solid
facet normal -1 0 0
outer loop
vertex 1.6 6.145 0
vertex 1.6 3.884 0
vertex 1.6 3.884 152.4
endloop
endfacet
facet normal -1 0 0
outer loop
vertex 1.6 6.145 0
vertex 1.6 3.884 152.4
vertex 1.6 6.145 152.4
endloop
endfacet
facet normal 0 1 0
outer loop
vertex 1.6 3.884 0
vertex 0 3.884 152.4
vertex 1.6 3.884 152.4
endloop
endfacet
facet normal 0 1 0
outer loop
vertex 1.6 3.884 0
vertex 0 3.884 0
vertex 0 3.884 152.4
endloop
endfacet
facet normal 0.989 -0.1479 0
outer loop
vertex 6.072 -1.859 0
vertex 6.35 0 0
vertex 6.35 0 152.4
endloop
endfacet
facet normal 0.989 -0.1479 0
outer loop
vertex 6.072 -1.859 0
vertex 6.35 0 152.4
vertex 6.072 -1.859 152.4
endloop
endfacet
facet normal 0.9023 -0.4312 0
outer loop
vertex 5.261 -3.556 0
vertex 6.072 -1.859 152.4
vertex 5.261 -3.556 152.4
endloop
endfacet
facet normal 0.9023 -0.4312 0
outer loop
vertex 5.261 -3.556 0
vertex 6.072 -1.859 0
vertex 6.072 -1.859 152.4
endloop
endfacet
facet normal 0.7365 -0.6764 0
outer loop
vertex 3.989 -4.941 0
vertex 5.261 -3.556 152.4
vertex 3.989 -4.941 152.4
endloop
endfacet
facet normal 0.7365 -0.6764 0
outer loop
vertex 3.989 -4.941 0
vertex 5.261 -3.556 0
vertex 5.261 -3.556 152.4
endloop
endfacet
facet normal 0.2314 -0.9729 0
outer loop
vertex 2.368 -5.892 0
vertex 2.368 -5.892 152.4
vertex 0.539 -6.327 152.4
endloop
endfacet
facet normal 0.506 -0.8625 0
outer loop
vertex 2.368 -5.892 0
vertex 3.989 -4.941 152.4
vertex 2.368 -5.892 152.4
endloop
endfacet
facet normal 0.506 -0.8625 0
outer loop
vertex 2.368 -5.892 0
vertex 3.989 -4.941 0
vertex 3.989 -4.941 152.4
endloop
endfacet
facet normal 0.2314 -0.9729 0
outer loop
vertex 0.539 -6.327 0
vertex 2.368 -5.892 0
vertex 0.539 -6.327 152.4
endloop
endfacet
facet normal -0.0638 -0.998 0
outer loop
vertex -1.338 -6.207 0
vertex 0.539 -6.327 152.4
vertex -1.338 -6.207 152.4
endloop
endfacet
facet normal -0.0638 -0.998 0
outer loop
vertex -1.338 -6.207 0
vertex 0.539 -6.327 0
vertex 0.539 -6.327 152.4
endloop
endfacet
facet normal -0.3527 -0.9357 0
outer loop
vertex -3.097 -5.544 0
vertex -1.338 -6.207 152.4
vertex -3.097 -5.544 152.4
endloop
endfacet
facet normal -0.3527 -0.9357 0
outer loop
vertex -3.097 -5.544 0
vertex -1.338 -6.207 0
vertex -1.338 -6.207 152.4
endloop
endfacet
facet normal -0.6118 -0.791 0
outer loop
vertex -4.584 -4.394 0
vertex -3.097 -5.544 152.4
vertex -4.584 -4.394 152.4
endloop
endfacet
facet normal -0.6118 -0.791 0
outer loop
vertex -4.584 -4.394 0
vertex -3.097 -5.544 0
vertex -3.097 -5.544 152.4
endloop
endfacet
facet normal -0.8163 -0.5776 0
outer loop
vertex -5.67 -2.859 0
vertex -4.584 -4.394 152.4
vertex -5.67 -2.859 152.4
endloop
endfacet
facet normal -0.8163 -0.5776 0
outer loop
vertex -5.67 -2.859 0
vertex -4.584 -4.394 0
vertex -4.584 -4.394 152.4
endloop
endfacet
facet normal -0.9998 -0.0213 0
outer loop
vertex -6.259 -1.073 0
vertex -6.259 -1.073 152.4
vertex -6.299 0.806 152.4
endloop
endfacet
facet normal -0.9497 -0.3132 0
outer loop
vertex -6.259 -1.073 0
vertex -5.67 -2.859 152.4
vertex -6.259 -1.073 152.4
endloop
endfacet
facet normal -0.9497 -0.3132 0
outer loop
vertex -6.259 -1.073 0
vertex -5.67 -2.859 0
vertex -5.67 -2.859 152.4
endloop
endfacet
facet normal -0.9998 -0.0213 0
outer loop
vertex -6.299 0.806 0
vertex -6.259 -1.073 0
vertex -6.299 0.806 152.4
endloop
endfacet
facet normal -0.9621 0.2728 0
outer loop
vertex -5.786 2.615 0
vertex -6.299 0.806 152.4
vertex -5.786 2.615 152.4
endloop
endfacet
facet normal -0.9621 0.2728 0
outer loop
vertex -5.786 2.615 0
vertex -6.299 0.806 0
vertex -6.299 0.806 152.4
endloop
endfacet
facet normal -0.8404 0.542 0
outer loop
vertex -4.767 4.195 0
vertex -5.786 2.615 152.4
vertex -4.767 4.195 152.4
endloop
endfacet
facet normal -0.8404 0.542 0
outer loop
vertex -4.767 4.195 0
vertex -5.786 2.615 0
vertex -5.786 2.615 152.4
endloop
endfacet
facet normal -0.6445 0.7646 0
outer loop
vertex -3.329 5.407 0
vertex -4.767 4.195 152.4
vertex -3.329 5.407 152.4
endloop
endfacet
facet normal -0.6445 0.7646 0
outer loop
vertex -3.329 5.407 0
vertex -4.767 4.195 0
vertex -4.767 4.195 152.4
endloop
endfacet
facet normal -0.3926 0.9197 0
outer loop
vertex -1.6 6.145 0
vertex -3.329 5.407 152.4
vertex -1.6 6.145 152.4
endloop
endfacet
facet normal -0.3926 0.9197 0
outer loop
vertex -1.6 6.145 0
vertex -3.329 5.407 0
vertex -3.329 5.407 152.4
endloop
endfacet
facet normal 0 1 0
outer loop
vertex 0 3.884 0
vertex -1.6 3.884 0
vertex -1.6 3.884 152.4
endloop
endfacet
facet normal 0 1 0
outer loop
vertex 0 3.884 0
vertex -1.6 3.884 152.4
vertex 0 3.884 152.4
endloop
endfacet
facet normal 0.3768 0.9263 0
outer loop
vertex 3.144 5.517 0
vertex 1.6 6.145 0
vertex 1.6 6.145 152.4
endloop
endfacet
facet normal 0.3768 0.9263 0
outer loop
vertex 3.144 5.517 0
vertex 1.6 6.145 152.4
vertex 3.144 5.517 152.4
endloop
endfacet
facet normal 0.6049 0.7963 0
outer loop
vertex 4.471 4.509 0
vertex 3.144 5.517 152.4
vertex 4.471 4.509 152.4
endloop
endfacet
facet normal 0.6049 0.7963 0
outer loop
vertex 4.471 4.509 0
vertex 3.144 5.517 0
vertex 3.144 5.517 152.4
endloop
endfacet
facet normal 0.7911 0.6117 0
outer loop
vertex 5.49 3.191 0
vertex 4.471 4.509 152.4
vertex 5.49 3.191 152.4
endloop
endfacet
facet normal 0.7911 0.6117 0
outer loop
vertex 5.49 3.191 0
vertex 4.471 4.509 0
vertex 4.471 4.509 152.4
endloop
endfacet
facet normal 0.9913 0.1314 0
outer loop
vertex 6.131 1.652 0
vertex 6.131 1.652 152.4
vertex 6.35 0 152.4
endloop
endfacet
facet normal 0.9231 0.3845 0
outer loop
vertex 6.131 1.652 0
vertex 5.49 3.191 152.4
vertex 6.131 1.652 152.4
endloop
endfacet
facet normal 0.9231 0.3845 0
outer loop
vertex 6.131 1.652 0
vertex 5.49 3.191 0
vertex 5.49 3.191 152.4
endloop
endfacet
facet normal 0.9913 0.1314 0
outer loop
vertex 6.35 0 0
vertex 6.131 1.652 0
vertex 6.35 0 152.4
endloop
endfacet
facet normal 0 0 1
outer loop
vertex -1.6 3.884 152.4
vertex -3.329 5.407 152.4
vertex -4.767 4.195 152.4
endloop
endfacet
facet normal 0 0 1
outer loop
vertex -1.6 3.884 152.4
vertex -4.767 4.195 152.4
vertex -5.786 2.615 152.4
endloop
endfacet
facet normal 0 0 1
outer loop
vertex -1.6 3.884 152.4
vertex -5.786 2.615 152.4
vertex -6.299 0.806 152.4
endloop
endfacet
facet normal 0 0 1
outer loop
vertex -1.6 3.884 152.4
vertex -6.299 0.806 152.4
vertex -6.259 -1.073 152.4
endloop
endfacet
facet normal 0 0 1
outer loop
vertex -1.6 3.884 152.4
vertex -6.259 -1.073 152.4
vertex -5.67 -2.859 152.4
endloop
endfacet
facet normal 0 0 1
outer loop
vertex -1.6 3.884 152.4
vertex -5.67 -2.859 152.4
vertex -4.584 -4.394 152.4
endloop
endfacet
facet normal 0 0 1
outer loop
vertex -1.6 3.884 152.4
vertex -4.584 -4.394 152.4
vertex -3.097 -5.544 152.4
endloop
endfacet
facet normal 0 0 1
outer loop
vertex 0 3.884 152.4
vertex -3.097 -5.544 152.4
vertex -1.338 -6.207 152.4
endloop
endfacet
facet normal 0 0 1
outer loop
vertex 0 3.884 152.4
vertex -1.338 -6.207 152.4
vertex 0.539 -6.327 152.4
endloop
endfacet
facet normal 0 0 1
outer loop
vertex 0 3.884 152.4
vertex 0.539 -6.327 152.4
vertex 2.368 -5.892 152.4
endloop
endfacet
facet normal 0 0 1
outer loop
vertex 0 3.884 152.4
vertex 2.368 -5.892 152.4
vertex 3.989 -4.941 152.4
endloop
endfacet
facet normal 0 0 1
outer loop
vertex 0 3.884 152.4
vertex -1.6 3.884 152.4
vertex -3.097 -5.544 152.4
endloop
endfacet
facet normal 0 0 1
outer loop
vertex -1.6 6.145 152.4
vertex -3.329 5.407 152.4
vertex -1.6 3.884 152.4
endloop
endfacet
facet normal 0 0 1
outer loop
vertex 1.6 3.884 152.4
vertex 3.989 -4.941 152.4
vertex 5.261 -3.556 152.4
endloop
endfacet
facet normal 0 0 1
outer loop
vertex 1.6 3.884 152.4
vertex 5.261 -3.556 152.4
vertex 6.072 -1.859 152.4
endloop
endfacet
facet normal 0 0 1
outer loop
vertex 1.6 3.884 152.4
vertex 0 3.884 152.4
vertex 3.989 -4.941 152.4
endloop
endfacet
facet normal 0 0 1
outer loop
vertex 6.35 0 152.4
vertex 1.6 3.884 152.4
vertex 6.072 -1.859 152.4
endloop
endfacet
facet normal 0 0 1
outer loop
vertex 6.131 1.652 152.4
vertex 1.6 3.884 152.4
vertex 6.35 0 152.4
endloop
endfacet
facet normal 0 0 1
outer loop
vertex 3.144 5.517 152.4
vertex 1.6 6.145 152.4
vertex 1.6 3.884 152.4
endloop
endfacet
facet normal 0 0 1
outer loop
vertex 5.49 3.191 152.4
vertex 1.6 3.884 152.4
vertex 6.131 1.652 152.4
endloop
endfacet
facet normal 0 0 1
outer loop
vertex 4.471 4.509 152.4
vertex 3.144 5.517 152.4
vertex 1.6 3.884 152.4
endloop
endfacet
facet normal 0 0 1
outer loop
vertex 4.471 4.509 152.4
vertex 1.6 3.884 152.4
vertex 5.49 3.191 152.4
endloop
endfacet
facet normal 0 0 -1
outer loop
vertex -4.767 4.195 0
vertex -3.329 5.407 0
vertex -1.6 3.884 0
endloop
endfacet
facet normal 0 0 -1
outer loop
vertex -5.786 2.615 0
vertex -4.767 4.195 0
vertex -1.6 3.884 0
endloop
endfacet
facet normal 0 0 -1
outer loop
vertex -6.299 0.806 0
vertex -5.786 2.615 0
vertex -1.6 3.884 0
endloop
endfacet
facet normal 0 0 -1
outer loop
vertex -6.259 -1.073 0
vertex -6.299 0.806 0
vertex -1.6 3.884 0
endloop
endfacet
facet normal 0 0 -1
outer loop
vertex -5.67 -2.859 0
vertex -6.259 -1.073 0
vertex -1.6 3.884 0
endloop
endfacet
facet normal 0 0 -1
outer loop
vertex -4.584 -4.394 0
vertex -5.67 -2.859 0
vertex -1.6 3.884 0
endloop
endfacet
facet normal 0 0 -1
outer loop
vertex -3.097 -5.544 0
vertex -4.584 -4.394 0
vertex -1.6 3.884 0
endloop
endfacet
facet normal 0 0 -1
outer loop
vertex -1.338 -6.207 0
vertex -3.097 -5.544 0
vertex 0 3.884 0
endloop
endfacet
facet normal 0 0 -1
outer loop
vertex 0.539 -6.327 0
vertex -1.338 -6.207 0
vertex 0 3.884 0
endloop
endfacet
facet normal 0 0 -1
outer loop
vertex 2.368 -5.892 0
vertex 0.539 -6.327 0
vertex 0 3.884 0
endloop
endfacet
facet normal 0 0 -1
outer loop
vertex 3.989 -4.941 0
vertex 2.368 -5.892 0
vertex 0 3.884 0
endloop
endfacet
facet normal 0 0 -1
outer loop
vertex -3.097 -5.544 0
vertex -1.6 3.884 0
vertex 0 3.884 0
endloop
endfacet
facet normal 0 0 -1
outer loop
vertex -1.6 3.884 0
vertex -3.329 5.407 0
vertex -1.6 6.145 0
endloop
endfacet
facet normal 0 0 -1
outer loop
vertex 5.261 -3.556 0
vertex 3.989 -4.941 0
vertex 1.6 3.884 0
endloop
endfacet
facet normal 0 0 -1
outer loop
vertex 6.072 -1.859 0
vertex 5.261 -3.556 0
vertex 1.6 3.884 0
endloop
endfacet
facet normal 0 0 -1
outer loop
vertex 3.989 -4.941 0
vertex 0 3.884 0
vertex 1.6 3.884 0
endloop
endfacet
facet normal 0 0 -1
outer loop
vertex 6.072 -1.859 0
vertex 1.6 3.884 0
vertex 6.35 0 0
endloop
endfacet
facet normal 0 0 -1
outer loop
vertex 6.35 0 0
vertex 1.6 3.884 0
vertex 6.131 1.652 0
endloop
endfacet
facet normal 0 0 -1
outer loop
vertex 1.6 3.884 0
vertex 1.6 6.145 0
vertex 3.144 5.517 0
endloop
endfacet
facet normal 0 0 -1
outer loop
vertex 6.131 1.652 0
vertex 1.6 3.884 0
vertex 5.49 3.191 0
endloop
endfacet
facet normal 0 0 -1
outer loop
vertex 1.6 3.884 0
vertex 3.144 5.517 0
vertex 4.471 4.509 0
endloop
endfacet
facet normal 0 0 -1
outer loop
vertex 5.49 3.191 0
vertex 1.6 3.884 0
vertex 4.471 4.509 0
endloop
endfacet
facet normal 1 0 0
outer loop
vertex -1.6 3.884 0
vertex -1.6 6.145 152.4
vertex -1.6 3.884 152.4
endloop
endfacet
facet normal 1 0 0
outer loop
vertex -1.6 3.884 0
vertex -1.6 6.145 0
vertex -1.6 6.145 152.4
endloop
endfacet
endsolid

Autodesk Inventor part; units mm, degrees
ref_plane "YZ Plane" through (0, 0, 0) normal (1, 0, 0) x (0, 1, 0)
ref_plane "XZ Plane" through (0, 0, 0) normal (0, 1, 0) x (-1, 0, 0)
ref_plane "XY Plane" through (0, 0, 0) normal (0, 0, 1) x (1, 0, 0)
sketch "Sketch1" plane through (0, 0, 0) normal (0, 0, 1) x (1, 0, 0)
  circle A0 centre (0, 0) radius 6.35
  line L0 (-1.6002, 6.1451) -> (-1.6002, 3.8845)
  line L1 (-1.6002, 3.8845) -> (1.6002, 3.8845)
  line L2 (1.6002, 3.8845) -> (1.6002, 6.1451)
  line L3 (0, 0) -> (0, 7.6821)
  dimension "d0" = 12.7
  dimension "d1" = 3.2004
  dimension "d2" = 1.6002
  dimension "d3" = 2.2606
extrude "Extrusion1" add sketch "Sketch1" along normal blind 152.4 contours A0 L0 L1 L2
properties part number ".5in diameter keyed axle"
